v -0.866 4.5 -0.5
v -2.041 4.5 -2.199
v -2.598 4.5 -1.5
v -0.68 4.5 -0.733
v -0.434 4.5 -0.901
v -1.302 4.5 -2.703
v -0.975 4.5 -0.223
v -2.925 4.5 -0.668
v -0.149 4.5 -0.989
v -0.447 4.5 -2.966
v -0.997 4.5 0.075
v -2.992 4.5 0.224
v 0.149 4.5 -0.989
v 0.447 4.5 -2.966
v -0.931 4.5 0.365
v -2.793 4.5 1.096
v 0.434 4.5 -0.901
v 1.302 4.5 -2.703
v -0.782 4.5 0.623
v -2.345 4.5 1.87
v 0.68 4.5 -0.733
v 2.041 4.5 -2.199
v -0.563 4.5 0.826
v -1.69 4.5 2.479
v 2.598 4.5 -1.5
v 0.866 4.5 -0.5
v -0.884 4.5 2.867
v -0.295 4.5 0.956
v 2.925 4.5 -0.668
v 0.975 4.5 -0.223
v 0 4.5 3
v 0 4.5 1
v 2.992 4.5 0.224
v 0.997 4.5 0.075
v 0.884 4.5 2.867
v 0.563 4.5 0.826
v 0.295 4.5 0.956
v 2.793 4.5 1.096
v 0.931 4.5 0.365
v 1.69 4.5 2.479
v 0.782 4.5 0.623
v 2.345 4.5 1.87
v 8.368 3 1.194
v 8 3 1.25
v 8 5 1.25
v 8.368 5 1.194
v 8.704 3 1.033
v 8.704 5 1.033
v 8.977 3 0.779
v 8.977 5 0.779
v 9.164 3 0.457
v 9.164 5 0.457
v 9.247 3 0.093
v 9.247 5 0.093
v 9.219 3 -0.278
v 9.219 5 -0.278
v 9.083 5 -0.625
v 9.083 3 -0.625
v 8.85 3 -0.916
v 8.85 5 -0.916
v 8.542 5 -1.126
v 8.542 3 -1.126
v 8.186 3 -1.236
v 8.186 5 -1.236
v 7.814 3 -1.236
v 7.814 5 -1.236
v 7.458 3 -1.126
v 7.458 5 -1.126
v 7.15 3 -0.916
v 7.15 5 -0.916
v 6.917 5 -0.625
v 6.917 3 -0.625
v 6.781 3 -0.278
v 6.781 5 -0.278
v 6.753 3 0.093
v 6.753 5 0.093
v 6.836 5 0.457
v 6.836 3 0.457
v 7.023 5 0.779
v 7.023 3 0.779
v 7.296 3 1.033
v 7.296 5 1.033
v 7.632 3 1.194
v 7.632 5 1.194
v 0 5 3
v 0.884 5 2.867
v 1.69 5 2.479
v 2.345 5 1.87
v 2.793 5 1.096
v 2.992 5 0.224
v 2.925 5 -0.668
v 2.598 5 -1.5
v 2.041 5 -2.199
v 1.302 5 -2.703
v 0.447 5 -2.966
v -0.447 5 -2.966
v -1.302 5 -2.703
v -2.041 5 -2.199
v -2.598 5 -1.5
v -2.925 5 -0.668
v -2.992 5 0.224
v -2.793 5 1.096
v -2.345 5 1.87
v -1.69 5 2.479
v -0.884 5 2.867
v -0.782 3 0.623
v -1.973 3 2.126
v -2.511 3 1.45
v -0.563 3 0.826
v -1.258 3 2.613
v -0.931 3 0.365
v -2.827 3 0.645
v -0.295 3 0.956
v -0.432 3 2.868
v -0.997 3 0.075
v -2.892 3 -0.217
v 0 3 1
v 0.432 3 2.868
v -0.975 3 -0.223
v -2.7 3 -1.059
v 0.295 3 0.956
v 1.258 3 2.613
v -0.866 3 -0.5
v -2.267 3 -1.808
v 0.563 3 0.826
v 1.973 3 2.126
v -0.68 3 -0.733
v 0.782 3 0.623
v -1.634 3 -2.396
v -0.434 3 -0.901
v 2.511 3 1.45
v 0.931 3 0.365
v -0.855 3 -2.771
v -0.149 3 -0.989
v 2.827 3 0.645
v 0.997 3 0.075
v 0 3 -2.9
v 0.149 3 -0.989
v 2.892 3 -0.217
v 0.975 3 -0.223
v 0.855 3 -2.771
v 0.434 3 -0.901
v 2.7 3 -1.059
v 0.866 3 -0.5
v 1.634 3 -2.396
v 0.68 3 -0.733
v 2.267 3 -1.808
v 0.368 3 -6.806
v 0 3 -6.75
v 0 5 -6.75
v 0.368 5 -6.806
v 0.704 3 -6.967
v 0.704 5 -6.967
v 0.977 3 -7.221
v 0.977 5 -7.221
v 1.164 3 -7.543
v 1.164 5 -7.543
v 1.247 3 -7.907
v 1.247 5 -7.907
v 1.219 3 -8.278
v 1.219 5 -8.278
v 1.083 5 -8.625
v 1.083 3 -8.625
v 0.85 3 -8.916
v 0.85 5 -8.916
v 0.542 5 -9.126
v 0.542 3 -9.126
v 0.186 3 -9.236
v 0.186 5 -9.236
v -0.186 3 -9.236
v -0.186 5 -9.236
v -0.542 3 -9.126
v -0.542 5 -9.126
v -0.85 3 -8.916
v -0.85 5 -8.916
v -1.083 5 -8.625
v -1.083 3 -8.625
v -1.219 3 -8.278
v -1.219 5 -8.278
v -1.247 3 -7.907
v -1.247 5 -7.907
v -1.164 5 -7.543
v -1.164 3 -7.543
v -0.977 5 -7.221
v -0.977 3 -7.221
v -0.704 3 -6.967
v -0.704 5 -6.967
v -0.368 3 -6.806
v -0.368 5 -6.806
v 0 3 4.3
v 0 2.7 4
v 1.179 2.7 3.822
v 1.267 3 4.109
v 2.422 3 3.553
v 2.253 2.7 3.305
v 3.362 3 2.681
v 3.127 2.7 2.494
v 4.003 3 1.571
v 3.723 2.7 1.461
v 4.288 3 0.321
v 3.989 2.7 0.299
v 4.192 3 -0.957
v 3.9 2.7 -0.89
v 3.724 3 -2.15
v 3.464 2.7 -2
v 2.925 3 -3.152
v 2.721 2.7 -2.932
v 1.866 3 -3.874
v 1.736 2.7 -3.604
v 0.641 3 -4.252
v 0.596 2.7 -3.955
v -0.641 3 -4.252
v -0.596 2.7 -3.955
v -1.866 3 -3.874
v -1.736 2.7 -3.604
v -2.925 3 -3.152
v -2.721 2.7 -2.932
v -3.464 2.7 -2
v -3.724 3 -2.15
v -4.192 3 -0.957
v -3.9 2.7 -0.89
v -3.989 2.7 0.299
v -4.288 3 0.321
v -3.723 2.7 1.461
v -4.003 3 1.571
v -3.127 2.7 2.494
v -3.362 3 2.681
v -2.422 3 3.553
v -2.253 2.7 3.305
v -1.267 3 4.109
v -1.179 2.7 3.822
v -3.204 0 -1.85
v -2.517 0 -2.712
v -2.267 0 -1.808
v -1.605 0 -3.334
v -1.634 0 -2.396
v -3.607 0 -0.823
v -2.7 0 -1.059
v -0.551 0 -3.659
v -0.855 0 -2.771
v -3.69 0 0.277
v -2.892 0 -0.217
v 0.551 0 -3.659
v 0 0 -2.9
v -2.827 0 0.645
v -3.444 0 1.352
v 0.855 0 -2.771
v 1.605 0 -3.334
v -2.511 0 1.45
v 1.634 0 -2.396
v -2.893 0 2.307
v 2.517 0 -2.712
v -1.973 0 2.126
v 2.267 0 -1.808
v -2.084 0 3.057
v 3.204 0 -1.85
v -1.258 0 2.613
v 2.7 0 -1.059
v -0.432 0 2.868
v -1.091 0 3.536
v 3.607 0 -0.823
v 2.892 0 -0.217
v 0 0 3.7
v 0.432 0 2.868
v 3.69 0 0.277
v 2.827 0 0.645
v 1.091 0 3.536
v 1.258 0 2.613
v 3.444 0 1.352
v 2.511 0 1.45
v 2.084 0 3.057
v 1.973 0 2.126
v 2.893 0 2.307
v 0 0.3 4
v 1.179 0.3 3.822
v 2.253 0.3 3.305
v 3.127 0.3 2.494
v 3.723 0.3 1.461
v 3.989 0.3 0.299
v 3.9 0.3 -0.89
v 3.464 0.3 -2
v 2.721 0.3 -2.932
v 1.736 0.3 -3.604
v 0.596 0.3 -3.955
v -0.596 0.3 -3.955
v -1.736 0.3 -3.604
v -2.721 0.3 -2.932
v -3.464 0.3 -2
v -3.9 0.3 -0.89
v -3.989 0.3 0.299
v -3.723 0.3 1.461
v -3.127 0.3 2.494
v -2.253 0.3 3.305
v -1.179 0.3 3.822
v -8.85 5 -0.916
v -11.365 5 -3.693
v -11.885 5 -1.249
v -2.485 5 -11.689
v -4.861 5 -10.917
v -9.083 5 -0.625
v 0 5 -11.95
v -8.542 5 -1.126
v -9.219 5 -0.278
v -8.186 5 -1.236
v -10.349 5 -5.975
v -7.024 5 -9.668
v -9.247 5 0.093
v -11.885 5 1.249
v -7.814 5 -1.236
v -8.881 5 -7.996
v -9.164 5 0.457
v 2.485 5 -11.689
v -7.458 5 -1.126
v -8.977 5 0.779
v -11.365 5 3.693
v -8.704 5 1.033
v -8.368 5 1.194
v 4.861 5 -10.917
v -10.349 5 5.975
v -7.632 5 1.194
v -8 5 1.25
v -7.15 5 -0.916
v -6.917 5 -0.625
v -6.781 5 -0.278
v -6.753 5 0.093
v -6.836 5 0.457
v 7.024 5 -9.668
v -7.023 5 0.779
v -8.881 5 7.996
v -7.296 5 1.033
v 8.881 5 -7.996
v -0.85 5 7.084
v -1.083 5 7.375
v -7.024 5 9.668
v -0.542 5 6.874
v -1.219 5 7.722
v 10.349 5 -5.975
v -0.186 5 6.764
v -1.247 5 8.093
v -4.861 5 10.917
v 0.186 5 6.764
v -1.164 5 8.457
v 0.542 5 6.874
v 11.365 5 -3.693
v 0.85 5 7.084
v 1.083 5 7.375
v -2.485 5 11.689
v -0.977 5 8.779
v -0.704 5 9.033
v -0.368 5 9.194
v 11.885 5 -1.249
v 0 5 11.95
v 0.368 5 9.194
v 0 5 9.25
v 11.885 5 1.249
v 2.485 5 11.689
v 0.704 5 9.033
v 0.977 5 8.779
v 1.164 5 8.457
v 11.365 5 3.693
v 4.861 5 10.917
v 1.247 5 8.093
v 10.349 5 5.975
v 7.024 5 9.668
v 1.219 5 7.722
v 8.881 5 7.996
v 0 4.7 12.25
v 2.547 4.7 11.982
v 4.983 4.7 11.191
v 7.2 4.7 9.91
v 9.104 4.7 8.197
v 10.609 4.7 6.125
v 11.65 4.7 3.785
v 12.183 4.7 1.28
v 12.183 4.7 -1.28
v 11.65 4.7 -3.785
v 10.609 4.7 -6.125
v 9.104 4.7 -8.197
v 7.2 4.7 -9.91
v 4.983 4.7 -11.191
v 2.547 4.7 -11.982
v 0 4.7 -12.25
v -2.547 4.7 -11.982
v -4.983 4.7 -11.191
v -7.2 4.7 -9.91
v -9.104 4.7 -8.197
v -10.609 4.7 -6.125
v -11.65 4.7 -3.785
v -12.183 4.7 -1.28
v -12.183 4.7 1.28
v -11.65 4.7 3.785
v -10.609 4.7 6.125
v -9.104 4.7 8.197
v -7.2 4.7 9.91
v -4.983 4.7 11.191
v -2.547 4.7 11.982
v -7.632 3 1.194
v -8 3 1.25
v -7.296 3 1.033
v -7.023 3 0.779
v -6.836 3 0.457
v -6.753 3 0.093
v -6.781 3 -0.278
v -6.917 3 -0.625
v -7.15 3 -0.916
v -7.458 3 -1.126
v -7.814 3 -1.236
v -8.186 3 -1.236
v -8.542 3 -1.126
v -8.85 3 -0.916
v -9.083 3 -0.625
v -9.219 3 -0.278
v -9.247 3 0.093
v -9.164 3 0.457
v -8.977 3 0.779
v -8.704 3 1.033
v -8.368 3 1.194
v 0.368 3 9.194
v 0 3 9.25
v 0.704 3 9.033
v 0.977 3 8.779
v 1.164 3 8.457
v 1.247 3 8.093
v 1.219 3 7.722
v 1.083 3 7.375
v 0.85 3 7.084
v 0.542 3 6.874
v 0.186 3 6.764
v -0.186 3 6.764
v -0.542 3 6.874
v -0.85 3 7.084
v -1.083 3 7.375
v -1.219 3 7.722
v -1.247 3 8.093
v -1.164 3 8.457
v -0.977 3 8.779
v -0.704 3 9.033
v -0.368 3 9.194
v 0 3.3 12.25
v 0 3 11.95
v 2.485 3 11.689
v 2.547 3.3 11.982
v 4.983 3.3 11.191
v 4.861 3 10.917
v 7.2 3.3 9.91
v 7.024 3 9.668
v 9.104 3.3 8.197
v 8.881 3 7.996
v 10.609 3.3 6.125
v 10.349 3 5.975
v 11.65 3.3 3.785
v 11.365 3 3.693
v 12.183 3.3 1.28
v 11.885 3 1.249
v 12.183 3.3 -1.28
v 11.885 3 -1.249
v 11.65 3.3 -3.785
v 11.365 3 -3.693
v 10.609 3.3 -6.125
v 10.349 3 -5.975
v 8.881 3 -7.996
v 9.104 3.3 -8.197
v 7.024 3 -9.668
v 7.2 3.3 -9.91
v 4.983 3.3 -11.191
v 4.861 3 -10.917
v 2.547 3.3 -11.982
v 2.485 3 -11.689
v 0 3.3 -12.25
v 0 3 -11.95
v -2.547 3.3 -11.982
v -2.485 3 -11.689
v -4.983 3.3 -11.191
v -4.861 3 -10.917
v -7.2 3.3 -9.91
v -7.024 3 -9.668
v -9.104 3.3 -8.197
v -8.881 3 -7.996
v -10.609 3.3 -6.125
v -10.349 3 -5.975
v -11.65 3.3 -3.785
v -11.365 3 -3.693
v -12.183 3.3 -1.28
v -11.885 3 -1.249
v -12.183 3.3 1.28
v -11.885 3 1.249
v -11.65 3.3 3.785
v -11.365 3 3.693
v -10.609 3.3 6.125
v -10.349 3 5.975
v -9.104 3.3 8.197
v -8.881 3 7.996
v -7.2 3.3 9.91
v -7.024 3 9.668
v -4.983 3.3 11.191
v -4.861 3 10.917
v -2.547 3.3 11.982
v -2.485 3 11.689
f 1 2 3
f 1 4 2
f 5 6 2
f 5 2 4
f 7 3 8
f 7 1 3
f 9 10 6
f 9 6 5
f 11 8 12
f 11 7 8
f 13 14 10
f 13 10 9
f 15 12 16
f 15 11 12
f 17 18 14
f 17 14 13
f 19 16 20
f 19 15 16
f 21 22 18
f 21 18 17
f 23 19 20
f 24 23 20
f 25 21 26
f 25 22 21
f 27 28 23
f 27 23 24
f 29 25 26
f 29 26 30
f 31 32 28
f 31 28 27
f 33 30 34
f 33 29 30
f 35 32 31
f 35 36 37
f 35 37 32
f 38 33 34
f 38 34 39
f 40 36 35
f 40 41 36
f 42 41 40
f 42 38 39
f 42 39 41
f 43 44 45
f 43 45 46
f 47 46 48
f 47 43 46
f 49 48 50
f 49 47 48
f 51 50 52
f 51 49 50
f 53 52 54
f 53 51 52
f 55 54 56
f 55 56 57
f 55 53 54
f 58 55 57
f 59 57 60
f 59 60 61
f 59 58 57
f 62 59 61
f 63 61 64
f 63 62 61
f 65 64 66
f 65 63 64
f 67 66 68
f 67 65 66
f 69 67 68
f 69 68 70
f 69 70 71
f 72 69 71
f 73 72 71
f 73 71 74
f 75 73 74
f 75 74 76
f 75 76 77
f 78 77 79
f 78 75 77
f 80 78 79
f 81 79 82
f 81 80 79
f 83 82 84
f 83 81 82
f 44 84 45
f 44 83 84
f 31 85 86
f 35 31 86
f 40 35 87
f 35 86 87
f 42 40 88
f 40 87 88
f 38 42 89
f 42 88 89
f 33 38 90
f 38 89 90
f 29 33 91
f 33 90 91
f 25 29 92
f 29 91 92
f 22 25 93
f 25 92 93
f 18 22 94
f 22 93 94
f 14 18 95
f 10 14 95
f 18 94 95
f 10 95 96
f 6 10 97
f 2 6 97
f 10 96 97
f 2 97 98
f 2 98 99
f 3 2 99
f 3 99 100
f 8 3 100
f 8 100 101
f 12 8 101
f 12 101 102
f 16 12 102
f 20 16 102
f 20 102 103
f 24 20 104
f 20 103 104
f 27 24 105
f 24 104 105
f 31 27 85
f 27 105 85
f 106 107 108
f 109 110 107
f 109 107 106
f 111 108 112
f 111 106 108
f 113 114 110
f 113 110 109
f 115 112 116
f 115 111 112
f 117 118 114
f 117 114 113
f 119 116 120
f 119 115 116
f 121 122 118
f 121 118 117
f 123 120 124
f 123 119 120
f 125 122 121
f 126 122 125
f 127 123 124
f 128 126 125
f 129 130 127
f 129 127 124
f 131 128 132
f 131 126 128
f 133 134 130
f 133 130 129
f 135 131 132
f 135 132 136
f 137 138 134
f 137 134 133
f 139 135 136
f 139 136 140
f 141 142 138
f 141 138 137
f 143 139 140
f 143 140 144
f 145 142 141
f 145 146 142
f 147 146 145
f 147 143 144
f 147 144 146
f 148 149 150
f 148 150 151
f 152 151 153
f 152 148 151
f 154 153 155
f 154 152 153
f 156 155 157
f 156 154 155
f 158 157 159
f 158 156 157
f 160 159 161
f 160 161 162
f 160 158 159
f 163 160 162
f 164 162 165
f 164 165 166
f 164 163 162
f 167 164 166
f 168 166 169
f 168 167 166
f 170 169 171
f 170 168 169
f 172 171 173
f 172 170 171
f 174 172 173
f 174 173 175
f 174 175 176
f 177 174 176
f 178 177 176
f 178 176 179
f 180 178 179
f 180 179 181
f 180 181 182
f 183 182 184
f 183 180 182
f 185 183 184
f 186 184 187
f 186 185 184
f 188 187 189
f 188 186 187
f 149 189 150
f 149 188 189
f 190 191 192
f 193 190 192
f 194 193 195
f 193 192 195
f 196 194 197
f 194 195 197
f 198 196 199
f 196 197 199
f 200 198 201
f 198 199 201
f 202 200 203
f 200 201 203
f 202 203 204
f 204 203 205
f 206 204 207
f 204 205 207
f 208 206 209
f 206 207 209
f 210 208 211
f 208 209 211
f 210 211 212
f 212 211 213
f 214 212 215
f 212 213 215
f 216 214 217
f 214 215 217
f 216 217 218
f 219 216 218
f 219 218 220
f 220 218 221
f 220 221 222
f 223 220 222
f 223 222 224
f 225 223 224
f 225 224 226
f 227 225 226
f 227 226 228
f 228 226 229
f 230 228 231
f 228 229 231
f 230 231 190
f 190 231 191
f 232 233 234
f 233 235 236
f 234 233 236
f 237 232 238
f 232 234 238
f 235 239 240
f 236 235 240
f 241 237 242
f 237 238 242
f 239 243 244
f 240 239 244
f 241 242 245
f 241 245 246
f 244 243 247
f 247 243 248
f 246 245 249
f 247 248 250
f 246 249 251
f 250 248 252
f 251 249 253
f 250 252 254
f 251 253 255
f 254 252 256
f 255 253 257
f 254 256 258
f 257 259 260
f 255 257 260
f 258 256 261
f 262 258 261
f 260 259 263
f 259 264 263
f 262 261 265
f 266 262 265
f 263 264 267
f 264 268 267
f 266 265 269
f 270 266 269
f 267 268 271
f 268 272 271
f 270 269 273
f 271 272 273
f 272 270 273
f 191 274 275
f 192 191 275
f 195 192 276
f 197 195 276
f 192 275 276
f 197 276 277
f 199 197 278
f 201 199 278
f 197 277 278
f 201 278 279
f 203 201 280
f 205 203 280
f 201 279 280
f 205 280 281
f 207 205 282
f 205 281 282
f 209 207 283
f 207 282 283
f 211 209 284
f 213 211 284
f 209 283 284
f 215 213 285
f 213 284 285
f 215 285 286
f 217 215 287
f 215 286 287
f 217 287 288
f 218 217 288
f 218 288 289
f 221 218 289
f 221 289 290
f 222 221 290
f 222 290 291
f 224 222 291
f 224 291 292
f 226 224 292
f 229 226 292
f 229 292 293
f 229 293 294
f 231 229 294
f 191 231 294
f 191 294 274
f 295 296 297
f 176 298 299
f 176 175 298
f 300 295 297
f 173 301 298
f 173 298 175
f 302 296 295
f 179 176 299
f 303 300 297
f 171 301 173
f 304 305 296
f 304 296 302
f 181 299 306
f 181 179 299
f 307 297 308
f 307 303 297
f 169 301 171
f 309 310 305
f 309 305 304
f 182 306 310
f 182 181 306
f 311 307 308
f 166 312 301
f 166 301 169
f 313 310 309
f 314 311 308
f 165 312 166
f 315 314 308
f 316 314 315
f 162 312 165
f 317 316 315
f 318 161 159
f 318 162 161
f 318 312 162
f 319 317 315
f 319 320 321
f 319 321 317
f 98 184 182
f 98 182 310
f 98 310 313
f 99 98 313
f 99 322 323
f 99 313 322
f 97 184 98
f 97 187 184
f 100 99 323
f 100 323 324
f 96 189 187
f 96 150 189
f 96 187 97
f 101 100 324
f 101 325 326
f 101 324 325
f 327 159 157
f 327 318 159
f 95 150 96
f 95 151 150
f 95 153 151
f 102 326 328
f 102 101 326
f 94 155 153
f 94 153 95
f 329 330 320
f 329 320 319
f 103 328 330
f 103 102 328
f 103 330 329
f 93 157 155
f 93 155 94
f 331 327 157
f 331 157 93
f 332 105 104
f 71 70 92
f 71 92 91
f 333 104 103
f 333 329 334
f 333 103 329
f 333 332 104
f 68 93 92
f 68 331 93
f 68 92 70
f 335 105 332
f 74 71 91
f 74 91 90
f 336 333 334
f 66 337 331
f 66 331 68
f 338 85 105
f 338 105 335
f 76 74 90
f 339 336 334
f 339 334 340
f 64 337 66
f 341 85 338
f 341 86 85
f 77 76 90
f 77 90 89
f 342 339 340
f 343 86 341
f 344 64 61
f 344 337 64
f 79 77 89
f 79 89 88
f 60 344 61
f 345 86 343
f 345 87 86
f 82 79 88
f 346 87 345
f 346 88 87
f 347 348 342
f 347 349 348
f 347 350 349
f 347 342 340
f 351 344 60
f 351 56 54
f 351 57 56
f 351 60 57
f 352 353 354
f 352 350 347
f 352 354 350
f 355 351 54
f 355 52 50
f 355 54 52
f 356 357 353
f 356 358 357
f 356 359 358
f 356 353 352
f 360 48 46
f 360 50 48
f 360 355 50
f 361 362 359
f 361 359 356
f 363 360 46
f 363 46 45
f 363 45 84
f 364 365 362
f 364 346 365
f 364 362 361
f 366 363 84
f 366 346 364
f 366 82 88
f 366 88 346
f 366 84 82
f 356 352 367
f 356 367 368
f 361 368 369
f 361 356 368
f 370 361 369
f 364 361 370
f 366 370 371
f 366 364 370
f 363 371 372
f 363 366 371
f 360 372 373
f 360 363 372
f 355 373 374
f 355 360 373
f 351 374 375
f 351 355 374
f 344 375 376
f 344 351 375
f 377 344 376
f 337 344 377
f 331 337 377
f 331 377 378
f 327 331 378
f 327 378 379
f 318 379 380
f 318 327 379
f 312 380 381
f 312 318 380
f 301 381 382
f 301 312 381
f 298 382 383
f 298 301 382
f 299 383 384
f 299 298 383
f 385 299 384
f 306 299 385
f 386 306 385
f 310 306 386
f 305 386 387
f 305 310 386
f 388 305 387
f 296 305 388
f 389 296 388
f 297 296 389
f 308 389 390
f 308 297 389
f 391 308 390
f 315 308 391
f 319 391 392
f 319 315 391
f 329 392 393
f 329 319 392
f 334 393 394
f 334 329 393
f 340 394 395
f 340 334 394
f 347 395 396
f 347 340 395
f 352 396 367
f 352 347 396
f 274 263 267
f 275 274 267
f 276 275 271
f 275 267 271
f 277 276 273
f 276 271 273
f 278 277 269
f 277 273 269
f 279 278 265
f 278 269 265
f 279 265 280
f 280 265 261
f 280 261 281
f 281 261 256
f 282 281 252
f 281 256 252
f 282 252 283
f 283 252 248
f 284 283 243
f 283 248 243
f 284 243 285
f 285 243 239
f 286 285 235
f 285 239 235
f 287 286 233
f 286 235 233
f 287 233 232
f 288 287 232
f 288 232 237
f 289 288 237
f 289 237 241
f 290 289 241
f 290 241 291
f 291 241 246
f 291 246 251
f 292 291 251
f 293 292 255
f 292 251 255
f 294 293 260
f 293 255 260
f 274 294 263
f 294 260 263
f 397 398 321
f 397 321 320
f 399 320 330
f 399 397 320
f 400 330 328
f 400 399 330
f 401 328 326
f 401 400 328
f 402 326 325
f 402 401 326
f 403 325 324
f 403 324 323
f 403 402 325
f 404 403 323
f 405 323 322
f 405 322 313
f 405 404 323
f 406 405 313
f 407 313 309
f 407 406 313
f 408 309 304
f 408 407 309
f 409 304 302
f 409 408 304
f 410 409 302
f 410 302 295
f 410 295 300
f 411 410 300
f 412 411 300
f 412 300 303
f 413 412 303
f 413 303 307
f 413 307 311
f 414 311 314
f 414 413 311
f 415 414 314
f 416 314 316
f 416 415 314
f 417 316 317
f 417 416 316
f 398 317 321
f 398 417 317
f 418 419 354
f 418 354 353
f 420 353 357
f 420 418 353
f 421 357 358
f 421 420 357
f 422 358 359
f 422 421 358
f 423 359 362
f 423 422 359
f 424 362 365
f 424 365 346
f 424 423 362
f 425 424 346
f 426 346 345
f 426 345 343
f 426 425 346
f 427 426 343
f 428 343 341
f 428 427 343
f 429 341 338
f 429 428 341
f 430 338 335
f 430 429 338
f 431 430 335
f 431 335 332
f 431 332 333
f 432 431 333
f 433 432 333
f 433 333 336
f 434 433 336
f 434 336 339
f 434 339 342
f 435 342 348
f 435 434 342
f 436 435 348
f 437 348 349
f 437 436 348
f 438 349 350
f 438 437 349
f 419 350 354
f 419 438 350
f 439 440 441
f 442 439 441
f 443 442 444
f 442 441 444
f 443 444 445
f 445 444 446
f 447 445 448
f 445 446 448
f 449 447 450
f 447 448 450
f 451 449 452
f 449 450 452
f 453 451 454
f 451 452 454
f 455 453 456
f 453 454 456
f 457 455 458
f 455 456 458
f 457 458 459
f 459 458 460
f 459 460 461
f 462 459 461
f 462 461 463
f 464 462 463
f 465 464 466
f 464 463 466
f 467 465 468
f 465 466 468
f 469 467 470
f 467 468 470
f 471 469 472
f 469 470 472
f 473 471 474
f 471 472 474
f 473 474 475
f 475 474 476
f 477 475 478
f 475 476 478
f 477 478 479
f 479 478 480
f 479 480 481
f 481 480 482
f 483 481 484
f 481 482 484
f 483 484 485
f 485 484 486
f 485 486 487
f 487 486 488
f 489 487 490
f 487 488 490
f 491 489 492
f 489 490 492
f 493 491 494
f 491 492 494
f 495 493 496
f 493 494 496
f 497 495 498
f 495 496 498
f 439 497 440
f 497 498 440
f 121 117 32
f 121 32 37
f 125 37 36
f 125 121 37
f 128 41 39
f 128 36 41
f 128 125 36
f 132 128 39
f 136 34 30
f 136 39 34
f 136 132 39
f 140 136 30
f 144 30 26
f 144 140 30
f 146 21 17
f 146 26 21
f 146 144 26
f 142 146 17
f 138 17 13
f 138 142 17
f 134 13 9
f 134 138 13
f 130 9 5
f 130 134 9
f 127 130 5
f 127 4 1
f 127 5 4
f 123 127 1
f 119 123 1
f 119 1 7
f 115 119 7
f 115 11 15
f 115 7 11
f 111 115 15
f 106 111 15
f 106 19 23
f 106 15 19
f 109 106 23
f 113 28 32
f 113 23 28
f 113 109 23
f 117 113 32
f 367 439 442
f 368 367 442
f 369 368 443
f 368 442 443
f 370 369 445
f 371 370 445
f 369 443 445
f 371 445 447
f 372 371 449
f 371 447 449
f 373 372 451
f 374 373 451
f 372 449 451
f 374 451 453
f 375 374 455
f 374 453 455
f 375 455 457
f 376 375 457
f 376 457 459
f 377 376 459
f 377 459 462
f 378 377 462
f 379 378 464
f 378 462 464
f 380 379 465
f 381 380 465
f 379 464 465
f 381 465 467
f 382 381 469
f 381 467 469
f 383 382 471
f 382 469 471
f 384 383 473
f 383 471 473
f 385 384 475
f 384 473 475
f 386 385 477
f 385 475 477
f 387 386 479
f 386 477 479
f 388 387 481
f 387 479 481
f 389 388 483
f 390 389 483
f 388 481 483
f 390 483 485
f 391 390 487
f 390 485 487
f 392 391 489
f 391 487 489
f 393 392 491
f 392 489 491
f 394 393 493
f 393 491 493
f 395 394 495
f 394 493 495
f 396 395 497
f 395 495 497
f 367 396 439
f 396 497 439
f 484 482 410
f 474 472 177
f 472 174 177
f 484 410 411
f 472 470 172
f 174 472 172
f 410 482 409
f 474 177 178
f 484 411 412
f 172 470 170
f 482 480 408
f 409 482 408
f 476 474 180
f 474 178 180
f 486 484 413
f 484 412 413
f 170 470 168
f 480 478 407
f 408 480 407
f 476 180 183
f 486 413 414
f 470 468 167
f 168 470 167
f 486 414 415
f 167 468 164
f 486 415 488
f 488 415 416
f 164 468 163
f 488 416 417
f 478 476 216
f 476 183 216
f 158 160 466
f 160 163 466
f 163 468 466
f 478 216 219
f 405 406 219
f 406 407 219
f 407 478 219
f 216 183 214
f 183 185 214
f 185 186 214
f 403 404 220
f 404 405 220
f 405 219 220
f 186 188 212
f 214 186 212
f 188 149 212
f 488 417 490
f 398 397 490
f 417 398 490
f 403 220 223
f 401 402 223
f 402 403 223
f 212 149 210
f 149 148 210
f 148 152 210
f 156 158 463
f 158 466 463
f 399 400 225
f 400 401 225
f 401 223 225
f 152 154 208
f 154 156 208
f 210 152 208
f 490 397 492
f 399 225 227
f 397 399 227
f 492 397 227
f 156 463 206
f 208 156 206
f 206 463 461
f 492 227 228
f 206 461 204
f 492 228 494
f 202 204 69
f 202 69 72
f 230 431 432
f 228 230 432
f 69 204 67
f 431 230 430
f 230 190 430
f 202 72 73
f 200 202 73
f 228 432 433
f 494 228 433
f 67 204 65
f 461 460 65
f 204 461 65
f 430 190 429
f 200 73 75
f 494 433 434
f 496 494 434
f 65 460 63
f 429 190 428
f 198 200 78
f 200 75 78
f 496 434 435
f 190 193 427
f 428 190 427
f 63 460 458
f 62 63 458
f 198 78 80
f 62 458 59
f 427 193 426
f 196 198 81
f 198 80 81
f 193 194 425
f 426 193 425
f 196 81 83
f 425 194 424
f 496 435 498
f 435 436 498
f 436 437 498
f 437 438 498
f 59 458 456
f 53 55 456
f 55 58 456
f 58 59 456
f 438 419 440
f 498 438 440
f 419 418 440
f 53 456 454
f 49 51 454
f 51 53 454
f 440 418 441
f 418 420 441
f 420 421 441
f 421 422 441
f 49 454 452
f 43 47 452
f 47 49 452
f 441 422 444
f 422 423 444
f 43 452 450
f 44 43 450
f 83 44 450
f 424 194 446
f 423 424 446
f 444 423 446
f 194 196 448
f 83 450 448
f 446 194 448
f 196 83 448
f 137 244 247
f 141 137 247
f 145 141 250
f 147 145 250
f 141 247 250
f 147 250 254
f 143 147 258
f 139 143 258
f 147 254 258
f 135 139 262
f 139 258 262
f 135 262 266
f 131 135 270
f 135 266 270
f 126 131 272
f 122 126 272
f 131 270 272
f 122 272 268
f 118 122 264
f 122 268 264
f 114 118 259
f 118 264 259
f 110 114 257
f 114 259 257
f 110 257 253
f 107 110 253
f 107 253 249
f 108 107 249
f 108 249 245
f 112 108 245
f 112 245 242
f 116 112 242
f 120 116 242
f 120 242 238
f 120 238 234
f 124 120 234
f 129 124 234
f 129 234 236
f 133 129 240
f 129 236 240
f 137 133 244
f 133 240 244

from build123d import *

# Parameters (mm, degrees)
SKETCH_1_R          = 4
SKETCH_1_R_2        = 1
EXTRUDE_1_DEPTH     = 5
EXTRUDE_START       = -2
SKETCH_2_R          = 12.25
SKETCH_2_R_2        = 4
SKETCH_2_R_3        = 1.25
EXTRUDE_2_DEPTH     = 2
CHAMFER_1_SIZE      = 0.3
SKETCH_3_R          = 3
CUT_EXTRUDE_1_DEPTH = 0.5
SKETCH_4_R          = 2.9
CUT_EXTRUDE_2_DEPTH = 3


with BuildPart() as part:
    # 草图1 → 凸台-拉伸1 (new body)
    with BuildSketch(Plane(origin=(0, 0, 0), x_dir=(1, 0, 0), z_dir=(0, 1, 0))):
        with Locations(Location((0, 0, 0), (0, 0, 270))):
            Circle(SKETCH_1_R)
        with Locations(Location((0, 0, 0), (0, 0, 270))):
            Circle(SKETCH_1_R_2, mode=Mode.SUBTRACT)
    extrude(amount=EXTRUDE_1_DEPTH)

    # 草图2 → 凸台-拉伸2 (add)
    with BuildSketch(Plane(origin=(0, 5, 0), x_dir=(1, 0, 0), z_dir=(0, 1, 0)).offset(EXTRUDE_START)):
        with Locations(Location((0, 0, 0), (0, 0, 270))):
            Circle(SKETCH_2_R)
        with Locations(Location((0, 0, 0), (0, 0, 270))):
            Circle(SKETCH_2_R_2, mode=Mode.SUBTRACT)
        with Locations(Location((0, 8, 0), (0, 0, 270))):
            Circle(SKETCH_2_R_3, mode=Mode.SUBTRACT)
        with Locations(Location((8, 0, 0), (0, 0, 270))):
            Circle(SKETCH_2_R_3, mode=Mode.SUBTRACT)
        with Locations(Location((0, -8, 0), (0, 0, 270))):
            Circle(SKETCH_2_R_3, mode=Mode.SUBTRACT)
        with Locations(Location((-8, 0, 0), (0, 0, 270))):
            Circle(SKETCH_2_R_3, mode=Mode.SUBTRACT)
    extrude(amount=EXTRUDE_2_DEPTH)

    # 倒角1
    chamfer_1_edges = [part.edges().sort_by_distance(p)[0] for p in [
        (0, 3, -12.25),
        (0, 5, -12.25),
        (0, 0, -4),
        (0, 3, -4),
    ]]
    chamfer(chamfer_1_edges, length=CHAMFER_1_SIZE)

    # 草图3 → 切除-拉伸1 (cut)
    with BuildSketch(Plane(origin=(0, 5, 0), x_dir=(1, 0, 0), z_dir=(0, 1, 0))):
        with Locations(Location((0, 0, 0), (0, 0, 270))):
            Circle(SKETCH_3_R)
    extrude(amount=-CUT_EXTRUDE_1_DEPTH, mode=Mode.SUBTRACT)

    # 草图4 → 切除-拉伸2 (cut)
    with BuildSketch(Plane.XZ):
        with Locations(Location((0, 0, 0), (0, 0, 270))):
            Circle(SKETCH_4_R)
    extrude(amount=-CUT_EXTRUDE_2_DEPTH, mode=Mode.SUBTRACT)


solid = part.part
